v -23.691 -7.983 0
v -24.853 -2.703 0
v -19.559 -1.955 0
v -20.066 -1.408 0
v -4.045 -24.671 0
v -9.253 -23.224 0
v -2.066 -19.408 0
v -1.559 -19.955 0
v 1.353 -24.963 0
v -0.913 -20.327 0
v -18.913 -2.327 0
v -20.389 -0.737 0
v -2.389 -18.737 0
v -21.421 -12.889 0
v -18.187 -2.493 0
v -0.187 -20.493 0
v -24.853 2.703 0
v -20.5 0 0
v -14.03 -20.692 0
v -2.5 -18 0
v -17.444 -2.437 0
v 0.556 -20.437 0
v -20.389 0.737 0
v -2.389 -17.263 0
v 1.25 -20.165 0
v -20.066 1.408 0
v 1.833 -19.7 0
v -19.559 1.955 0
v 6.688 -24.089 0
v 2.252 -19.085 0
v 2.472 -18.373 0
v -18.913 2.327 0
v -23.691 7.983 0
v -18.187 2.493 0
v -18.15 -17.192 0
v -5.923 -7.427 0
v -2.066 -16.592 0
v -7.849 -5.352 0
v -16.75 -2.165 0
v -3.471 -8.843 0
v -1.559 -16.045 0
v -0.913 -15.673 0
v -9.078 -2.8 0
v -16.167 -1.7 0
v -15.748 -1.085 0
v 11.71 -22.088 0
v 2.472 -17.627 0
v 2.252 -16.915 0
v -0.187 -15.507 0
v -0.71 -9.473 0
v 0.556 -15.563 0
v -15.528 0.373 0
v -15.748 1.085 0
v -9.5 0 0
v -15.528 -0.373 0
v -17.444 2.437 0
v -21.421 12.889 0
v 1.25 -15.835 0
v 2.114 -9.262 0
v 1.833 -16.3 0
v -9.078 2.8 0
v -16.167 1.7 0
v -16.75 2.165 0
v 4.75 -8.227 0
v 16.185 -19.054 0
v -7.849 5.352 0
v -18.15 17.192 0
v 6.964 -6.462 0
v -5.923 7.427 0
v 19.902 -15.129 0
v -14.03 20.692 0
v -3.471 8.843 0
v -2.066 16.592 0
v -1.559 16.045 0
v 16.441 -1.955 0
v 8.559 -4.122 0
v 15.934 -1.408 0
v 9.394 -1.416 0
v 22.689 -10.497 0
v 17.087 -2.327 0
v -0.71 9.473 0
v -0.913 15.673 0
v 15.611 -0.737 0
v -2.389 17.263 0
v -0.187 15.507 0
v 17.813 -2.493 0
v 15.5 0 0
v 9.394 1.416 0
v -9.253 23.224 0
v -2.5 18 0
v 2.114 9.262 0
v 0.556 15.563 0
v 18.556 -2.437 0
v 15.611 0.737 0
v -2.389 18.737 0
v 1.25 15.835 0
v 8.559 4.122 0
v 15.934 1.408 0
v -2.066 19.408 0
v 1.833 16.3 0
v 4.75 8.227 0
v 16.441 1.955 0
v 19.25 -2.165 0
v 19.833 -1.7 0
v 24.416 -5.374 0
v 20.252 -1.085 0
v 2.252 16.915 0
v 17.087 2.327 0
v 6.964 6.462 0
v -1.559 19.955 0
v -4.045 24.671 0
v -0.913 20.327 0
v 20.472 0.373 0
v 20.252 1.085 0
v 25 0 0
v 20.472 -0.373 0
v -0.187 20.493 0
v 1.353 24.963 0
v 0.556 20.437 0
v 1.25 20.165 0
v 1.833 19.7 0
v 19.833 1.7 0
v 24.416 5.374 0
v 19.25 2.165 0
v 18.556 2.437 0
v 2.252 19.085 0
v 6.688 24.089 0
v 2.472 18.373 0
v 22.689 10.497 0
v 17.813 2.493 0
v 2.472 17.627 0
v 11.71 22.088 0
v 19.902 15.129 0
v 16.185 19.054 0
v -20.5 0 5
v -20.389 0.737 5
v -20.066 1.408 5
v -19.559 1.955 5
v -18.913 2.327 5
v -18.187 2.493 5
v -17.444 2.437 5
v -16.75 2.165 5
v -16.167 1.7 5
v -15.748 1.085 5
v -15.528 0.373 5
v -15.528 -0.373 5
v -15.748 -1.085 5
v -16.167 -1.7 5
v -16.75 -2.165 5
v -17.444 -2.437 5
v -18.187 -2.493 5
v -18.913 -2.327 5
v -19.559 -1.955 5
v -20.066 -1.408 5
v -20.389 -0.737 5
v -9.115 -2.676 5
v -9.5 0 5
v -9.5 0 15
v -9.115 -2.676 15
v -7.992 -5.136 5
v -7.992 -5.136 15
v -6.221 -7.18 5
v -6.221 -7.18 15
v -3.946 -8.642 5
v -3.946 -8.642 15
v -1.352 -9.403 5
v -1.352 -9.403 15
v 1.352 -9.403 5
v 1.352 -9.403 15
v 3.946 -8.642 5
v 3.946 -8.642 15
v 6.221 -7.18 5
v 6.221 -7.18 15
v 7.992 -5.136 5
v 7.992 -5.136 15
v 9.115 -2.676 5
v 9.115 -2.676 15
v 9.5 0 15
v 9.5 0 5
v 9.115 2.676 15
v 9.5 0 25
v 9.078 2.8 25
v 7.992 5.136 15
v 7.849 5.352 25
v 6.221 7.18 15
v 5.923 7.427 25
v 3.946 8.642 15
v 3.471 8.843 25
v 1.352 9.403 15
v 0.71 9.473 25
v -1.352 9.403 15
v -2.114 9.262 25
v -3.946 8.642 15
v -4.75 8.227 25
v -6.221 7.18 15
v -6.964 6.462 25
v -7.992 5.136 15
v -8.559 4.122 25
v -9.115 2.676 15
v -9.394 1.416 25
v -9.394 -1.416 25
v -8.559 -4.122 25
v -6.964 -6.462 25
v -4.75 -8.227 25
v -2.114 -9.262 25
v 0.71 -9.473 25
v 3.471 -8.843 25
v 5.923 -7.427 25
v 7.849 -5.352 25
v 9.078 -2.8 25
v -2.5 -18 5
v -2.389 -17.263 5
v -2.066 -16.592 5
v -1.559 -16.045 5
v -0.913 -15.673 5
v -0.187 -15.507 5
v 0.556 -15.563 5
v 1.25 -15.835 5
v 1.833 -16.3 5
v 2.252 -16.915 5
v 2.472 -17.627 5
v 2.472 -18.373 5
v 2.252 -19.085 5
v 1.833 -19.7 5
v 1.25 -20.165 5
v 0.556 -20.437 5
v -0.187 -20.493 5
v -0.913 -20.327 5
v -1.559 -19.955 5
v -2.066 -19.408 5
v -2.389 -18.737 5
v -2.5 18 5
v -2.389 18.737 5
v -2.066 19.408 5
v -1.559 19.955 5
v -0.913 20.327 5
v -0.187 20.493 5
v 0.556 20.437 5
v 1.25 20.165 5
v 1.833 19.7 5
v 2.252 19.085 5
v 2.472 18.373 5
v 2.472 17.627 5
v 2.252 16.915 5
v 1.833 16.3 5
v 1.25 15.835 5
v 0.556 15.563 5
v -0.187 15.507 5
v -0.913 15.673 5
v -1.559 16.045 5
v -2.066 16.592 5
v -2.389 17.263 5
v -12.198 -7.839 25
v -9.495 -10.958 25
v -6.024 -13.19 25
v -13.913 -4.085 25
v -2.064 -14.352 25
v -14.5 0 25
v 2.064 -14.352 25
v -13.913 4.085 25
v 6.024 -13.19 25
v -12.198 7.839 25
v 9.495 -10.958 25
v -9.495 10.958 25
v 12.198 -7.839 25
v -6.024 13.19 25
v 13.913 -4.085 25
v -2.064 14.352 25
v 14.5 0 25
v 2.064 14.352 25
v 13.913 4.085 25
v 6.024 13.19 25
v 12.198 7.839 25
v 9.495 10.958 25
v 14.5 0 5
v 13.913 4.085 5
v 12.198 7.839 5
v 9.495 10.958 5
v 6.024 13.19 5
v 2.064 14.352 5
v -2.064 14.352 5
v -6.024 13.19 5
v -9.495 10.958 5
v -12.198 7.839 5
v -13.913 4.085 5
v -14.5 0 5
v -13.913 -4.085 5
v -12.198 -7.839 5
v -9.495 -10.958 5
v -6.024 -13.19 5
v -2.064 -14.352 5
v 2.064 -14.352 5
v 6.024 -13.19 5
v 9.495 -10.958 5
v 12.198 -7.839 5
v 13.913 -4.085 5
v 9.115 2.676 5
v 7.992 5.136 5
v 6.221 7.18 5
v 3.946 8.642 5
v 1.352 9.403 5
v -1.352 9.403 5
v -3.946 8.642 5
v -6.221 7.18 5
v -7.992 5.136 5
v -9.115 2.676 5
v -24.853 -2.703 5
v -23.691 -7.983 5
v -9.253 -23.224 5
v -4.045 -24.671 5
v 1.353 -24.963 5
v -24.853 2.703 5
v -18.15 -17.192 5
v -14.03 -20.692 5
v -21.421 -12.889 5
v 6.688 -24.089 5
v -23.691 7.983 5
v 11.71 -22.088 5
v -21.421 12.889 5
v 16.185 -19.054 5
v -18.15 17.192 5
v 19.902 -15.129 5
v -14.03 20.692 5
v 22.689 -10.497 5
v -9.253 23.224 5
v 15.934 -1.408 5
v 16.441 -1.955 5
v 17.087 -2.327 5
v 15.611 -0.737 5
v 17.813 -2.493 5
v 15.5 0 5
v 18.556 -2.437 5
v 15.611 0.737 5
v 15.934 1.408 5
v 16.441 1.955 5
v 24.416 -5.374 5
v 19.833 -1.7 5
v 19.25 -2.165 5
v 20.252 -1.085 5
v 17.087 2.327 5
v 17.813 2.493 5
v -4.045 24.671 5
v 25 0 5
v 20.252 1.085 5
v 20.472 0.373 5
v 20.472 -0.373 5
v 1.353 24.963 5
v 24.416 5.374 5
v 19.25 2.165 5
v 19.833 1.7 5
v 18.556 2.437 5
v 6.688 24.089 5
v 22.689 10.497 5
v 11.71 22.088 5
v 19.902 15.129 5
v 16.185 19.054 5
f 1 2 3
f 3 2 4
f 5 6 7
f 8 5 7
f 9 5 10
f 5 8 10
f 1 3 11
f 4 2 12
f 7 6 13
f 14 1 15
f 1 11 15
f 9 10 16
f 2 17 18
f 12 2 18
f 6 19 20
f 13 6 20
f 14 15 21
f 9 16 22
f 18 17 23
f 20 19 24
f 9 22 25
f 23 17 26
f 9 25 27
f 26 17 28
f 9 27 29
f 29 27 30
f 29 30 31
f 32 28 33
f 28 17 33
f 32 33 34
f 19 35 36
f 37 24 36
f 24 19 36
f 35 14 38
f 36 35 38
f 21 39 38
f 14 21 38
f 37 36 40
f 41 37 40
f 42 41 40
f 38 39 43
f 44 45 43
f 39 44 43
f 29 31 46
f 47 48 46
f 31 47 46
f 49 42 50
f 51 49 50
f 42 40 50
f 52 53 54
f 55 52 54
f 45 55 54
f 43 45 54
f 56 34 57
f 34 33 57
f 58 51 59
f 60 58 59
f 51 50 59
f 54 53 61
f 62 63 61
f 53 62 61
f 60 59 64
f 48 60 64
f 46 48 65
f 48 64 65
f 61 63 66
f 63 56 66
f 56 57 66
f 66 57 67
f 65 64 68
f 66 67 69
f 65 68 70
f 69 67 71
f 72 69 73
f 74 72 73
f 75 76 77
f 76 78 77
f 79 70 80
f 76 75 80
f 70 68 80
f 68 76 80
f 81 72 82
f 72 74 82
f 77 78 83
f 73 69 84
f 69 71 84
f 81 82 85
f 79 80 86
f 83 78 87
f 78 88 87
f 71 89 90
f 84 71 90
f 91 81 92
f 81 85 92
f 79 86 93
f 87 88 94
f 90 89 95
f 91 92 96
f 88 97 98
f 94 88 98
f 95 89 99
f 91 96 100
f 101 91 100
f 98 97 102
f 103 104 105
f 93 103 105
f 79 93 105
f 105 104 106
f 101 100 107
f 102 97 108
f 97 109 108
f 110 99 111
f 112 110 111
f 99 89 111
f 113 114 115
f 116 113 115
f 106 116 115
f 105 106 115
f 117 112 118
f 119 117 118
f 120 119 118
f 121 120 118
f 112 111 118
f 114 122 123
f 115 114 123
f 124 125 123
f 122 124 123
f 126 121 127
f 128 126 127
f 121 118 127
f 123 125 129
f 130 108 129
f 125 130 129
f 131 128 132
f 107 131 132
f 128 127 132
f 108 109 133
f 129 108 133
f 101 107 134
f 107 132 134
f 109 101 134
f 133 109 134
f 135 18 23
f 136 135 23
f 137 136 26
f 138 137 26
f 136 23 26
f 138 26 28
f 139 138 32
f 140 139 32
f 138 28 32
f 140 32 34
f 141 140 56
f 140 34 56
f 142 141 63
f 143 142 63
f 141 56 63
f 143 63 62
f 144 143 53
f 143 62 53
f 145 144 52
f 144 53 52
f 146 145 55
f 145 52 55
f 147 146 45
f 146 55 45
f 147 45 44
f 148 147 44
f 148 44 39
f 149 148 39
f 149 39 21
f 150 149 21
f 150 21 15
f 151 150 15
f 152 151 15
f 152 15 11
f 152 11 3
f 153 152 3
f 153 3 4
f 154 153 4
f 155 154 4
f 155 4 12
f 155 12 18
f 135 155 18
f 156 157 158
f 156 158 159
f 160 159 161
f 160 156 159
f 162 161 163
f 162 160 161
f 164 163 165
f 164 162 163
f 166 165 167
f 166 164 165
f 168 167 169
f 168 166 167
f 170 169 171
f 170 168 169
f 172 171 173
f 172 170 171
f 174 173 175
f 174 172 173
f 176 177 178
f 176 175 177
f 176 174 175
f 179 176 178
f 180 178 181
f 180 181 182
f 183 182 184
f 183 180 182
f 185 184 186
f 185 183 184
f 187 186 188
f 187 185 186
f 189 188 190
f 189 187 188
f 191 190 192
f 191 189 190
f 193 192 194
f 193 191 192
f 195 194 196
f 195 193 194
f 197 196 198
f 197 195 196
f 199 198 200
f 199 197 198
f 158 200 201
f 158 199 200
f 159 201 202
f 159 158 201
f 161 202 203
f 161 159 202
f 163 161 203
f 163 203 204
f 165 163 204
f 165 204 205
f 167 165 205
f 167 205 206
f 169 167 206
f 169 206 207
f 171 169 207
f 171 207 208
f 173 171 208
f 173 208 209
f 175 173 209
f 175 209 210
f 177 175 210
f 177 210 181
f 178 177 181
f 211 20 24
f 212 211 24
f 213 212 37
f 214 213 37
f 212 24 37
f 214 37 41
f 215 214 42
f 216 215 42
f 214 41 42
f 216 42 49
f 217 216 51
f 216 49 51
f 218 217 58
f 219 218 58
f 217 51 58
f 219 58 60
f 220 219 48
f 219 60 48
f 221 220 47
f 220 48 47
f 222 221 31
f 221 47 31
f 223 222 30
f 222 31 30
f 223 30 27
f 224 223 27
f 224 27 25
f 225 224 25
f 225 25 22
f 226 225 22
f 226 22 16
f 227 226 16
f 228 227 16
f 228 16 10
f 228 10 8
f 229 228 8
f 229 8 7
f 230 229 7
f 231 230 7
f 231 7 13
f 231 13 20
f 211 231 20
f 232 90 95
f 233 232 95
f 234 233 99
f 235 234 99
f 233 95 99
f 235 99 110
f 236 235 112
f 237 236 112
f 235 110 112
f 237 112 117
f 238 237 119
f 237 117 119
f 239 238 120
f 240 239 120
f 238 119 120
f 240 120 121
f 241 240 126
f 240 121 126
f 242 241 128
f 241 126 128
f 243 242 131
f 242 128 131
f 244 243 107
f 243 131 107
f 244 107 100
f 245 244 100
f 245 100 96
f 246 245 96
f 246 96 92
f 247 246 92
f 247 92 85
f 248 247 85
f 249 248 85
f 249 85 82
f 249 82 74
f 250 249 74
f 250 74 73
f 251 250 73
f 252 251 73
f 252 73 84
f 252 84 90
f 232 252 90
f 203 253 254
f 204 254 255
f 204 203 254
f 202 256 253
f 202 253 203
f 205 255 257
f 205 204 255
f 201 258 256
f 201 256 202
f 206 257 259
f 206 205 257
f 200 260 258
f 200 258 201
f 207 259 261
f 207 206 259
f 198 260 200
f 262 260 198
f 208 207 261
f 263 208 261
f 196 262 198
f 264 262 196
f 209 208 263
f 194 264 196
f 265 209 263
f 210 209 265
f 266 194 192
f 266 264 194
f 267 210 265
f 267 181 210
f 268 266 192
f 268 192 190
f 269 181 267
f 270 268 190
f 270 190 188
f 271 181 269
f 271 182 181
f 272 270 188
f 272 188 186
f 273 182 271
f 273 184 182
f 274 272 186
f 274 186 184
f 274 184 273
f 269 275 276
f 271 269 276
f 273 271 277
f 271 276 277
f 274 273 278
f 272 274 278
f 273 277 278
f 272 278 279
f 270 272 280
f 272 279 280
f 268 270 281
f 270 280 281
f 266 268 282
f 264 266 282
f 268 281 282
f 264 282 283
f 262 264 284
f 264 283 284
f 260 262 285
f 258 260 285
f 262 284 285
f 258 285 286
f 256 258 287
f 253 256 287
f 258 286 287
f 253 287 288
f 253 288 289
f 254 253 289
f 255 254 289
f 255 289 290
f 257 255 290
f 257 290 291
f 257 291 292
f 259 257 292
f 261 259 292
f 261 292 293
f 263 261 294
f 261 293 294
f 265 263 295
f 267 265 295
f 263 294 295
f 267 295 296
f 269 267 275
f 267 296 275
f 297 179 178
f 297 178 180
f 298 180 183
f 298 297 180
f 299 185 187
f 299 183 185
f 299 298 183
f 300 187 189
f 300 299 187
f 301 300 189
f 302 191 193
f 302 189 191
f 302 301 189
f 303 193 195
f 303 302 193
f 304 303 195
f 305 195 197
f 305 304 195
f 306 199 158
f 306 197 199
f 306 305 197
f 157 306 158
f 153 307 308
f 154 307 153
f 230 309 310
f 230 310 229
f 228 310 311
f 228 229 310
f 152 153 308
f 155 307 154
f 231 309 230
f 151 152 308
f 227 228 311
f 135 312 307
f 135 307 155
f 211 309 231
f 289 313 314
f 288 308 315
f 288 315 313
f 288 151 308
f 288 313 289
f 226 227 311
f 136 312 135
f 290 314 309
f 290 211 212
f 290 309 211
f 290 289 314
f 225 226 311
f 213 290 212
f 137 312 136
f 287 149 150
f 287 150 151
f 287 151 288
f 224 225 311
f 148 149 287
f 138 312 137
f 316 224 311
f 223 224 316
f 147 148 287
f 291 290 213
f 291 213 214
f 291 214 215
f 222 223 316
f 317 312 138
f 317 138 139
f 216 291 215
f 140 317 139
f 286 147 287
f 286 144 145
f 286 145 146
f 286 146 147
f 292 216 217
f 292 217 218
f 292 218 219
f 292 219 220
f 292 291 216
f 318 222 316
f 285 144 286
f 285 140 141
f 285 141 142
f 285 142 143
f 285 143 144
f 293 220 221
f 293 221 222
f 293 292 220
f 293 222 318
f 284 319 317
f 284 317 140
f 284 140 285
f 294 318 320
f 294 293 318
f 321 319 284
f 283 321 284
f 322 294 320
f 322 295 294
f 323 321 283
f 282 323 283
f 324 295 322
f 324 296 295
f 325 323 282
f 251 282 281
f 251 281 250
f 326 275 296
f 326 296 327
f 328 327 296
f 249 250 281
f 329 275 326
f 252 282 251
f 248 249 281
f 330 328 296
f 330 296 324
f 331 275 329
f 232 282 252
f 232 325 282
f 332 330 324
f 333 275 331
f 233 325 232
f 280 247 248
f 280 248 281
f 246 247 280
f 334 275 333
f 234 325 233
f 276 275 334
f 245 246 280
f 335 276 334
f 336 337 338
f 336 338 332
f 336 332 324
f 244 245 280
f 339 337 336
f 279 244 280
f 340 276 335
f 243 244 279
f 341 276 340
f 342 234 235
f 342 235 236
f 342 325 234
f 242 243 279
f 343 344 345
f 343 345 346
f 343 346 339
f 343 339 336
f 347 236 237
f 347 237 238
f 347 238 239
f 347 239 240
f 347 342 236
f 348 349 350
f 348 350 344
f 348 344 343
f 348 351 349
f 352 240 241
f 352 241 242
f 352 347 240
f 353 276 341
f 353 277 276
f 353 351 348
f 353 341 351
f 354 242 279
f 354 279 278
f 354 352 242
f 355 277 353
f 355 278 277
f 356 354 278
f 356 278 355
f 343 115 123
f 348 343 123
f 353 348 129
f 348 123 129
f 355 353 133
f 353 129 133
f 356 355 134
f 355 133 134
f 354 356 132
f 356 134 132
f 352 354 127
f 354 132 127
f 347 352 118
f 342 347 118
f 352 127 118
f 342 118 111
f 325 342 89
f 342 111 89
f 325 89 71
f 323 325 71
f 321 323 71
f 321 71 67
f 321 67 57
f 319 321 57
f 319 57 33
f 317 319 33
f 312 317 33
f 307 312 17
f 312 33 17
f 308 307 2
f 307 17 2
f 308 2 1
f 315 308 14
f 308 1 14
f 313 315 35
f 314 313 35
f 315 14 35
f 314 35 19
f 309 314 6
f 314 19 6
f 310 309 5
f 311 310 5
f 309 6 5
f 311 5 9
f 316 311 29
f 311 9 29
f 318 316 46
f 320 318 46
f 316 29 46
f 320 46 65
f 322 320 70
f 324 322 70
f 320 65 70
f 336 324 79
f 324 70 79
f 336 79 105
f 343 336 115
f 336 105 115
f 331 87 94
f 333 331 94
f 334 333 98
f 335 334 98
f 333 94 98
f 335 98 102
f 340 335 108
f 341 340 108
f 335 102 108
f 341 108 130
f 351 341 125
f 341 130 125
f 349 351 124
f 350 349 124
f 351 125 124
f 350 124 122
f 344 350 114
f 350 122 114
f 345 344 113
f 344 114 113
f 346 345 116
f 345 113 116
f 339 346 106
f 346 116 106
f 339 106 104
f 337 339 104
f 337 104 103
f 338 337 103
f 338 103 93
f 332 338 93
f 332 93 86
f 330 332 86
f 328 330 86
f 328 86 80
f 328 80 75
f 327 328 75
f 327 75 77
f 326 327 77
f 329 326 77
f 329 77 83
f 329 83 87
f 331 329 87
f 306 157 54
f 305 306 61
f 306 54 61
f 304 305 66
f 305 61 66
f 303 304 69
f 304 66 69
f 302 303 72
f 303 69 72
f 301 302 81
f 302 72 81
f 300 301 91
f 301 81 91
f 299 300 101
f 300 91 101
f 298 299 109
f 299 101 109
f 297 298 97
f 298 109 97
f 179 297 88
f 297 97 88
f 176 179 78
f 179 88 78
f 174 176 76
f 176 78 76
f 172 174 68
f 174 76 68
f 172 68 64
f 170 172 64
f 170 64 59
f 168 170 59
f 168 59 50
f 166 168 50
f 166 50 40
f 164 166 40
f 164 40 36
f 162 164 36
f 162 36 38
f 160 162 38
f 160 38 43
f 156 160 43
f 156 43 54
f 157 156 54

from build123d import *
from build123d.topology import SkipClean

# Parameters (mm, degrees)
SKETCH1_R           = 25
BOSS_EXTRUDE1_DEPTH = 5
SKETCH2_R           = 14.5
SKETCH2_R_2         = 9.5
BOSS_EXTRUDE2_DEPTH = 20
SKETCH3_R           = 9.5
CUT_EXTRUDE1_DEPTH  = 15
SKETCH4_R           = 2.5
CUT_EXTRUDE2_DEPTH  = 10


with BuildPart() as part:
    # Sketch1 → Boss-Extrude1 (new body)
    with BuildSketch(Plane.XY):
        Circle(SKETCH1_R)
    extrude(amount=BOSS_EXTRUDE1_DEPTH)

    # Sketch2 → Boss-Extrude2 (add)
    with BuildSketch(Plane.XY.offset(5)):
        Circle(SKETCH2_R)
        Circle(SKETCH2_R_2, mode=Mode.SUBTRACT)
    extrude(amount=BOSS_EXTRUDE2_DEPTH)

    # Sketch3 → Cut-Extrude1 (cut)
    with SkipClean():  # the faces are left unmerged after this step: merging them gives an invalid solid
        with BuildSketch(Plane(origin=(0, 0, 0), x_dir=(-1, 0, 0), z_dir=(0, 0, -1))):
            Circle(SKETCH3_R)
        extrude(amount=-CUT_EXTRUDE1_DEPTH, mode=Mode.SUBTRACT)
    add(part.part.scale(1), mode=Mode.REPLACE)  # the faces are merged on a copy

    # Sketch4 → Cut-Extrude2 (cut)
    with BuildSketch(Plane(origin=(0, 0, 0), x_dir=(-1, 0, 0), z_dir=(0, 0, -1))):
        with Locations((0, 18)):
            Circle(SKETCH4_R)
        with Locations((18, 0)):
            Circle(SKETCH4_R)
        with Locations((0, -18)):
            Circle(SKETCH4_R)
        with Locations((-18, 0)):
            Circle(SKETCH4_R)
    extrude(amount=-CUT_EXTRUDE2_DEPTH, mode=Mode.SUBTRACT)


solid = part.part
